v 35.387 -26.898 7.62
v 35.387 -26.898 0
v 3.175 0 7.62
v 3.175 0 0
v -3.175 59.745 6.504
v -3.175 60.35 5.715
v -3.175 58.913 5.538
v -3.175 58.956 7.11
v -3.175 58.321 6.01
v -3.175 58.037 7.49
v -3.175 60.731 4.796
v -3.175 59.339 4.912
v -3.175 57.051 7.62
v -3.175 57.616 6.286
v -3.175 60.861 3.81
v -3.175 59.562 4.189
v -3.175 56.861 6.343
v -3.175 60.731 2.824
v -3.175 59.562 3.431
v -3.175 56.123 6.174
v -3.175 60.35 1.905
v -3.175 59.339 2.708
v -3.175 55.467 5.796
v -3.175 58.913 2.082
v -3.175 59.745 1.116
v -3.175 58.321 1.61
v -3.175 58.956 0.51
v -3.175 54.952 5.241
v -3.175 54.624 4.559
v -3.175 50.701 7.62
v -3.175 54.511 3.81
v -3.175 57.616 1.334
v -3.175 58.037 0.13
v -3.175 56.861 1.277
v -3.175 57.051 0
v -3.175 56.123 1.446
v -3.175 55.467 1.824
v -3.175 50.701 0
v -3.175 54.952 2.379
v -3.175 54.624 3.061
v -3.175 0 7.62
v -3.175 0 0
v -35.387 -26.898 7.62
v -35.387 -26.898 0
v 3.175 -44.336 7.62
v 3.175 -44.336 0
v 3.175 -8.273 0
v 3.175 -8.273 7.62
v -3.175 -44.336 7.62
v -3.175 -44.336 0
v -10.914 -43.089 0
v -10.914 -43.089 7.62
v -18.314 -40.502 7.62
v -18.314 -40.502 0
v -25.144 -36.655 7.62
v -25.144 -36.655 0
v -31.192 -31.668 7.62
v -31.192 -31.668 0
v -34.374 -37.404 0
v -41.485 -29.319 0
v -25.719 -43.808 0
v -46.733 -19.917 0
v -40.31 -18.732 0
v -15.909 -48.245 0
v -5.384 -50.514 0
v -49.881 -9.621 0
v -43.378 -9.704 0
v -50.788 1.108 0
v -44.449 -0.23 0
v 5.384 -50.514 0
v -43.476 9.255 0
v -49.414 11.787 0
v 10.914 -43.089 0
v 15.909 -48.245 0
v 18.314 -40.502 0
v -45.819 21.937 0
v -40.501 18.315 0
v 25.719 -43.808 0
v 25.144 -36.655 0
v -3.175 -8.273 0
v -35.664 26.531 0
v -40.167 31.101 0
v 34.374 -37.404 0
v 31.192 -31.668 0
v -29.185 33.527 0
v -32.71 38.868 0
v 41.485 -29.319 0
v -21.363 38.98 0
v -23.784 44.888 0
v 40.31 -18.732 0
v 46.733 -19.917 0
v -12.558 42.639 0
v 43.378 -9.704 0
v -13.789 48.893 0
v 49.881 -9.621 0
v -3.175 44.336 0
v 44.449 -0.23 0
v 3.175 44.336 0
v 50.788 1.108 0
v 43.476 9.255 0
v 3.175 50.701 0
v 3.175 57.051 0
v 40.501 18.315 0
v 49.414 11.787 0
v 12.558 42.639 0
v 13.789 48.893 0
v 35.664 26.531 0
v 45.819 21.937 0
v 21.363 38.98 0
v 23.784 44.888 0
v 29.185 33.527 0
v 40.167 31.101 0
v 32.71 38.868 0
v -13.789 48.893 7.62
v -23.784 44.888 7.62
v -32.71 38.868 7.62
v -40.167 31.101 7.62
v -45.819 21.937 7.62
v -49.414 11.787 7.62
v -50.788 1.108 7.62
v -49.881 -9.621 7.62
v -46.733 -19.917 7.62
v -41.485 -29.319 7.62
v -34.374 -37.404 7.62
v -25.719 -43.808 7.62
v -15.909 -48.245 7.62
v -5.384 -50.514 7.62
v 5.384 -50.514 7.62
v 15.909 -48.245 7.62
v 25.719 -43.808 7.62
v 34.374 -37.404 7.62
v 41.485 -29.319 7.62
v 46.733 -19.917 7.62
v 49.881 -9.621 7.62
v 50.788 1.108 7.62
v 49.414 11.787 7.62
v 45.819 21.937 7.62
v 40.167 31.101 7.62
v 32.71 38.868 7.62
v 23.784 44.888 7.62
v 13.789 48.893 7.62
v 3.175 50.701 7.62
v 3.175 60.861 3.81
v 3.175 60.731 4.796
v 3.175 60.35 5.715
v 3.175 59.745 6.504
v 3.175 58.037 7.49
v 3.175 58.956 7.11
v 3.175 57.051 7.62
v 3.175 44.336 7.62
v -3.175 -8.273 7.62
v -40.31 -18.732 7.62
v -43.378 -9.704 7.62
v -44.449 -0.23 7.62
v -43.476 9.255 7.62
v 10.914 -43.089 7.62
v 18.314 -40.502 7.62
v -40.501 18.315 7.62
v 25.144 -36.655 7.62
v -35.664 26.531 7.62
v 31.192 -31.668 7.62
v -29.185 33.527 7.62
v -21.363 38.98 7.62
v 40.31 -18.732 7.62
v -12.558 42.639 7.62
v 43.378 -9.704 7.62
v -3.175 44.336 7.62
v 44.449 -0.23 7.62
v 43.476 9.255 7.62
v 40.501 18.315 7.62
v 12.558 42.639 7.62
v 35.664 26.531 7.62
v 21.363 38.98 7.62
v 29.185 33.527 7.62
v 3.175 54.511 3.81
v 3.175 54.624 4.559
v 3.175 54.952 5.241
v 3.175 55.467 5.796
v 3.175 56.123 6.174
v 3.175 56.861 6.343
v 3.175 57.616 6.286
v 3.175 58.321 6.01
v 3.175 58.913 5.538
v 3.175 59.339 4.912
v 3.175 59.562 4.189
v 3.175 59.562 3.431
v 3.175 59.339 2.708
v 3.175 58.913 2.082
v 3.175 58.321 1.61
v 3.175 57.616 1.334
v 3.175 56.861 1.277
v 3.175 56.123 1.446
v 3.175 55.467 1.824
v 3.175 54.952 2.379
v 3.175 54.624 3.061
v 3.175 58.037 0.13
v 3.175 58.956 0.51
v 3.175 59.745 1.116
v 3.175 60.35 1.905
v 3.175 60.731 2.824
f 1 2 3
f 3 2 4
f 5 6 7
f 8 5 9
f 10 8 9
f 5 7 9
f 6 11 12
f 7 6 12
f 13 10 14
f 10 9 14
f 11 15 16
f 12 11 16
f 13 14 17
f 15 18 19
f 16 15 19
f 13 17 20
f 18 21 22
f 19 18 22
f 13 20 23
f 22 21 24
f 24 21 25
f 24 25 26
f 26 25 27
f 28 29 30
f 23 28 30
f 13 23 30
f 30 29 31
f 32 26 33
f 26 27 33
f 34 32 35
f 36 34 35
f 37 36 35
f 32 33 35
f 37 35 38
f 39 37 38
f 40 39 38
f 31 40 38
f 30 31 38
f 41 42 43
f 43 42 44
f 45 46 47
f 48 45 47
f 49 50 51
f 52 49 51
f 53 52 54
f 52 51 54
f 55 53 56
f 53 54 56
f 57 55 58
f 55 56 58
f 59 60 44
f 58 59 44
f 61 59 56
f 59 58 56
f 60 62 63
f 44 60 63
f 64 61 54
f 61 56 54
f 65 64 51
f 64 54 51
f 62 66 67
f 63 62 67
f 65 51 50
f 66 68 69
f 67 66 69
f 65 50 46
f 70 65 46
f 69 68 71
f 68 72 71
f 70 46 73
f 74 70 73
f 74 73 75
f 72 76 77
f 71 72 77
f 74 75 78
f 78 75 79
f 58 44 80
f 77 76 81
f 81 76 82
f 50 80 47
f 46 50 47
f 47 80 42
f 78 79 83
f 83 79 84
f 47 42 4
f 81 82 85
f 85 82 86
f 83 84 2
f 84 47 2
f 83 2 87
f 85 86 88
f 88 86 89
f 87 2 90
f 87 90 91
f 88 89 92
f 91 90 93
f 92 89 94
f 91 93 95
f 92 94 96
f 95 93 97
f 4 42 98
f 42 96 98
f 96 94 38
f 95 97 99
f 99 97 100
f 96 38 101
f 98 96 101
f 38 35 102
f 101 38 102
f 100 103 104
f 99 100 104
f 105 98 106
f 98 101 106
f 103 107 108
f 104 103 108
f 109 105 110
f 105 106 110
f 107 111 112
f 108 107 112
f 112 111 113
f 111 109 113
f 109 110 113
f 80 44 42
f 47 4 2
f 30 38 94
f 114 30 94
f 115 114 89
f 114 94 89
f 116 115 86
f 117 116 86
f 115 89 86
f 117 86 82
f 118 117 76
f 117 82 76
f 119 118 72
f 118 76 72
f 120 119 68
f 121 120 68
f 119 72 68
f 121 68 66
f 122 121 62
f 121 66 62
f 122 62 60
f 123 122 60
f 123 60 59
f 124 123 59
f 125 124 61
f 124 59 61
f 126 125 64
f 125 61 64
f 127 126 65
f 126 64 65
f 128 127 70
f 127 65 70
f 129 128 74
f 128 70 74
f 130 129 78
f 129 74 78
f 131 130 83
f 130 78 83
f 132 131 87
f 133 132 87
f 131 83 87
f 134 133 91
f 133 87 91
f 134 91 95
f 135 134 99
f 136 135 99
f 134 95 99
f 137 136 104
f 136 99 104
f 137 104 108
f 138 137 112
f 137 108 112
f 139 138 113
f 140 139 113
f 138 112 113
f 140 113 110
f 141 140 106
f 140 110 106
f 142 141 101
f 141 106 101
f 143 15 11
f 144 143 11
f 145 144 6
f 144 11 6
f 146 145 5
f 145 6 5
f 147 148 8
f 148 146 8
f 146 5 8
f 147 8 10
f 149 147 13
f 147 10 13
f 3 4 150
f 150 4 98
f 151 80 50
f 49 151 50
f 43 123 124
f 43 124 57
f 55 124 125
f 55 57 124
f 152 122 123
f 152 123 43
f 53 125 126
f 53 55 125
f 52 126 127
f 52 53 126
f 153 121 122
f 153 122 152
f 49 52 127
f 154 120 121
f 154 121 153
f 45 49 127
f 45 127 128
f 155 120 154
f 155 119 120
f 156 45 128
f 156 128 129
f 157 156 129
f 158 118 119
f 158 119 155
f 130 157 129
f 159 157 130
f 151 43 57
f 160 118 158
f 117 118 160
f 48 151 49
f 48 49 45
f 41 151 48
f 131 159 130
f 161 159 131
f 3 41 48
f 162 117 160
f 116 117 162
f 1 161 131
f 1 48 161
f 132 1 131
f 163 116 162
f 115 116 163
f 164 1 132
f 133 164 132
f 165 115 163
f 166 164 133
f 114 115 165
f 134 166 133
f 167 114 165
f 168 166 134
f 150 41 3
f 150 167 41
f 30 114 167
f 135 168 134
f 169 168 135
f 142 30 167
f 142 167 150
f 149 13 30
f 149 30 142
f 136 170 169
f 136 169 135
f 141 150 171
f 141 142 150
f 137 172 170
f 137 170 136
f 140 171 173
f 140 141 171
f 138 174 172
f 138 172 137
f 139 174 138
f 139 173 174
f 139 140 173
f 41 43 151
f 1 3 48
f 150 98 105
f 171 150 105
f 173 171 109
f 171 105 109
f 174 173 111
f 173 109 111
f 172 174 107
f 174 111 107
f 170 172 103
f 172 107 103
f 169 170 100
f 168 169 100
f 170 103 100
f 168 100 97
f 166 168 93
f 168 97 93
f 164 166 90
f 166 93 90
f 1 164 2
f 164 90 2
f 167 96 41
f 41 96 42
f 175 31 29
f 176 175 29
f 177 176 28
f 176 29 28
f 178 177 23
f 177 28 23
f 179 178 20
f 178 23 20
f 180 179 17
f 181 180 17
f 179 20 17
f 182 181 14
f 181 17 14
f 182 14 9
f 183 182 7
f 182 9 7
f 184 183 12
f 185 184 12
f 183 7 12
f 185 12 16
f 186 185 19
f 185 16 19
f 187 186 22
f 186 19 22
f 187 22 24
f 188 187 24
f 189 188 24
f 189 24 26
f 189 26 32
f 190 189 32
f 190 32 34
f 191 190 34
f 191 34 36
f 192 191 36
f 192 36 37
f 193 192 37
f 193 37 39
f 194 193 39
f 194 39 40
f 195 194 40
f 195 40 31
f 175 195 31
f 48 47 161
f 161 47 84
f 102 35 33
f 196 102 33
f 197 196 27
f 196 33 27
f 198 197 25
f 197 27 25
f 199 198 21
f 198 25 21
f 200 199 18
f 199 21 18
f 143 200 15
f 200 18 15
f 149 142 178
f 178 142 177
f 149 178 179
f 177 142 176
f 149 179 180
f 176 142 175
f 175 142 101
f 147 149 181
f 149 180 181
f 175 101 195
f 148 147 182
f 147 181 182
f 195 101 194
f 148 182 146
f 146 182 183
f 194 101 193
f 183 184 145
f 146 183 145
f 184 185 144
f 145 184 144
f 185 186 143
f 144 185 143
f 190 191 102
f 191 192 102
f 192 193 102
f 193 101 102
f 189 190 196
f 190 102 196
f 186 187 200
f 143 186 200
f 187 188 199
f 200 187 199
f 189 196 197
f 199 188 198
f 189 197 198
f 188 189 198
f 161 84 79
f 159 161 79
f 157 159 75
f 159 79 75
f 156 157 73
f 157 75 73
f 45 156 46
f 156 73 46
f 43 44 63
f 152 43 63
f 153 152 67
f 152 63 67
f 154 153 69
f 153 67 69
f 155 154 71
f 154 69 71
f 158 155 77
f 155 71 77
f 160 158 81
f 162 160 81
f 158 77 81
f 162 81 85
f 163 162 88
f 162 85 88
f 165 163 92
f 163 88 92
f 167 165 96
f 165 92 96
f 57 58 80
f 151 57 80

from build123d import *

# Parameters (mm, degrees)
F1_DEPTH = 7.62
F2_R     = 2.54
F3_DEPTH = 25.4


with BuildPart() as f1:
    # F0 (on Top) → F1 (new body)
    with BuildSketch(Plane.XY):
        with BuildLine():
            Line((-3.175, 60.860684), (-3.175, 50.700684))
            ThreePointArc((-3.175, 50.700684), (0, -50.8), (3.175, 50.700684))
            Line((3.175, 50.700684), (3.175, 60.860684))
            Line((3.175, 60.860684), (-3.175, 60.860684))
        make_face()
        with BuildLine():
            Line((-31.192057, -31.667934), (-3.175, -8.272762))
            Line((-3.175, -8.272762), (-3.175, -44.336462))
            ThreePointArc((-3.175, -44.336462), (-18.313835, -40.501925), (-31.192057, -31.667934))
        make_face(mode=Mode.SUBTRACT)
        with BuildLine():
            Line((3.175, -44.336462), (3.175, -8.272762))
            Line((3.175, -8.272762), (31.192057, -31.667934))
            ThreePointArc((31.192057, -31.667934), (18.313835, -40.501925), (3.175, -44.336462))
        make_face(mode=Mode.SUBTRACT)
        with BuildLine():
            ThreePointArc((-35.38748, -26.89849), (-40.501491, 18.314794), (-3.175, 44.336462))
            Line((-3.175, 44.336462), (-3.175, 0))
            Line((-3.175, 0), (-35.38748, -26.89849))
        make_face(mode=Mode.SUBTRACT)
        with BuildLine():
            Line((3.175, 0), (3.175, 44.336462))
            ThreePointArc((3.175, 44.336462), (40.501491, 18.314794), (35.38748, -26.89849))
            Line((35.38748, -26.89849), (3.175, 0))
        make_face(mode=Mode.SUBTRACT)
    extrude(amount=F1_DEPTH)

    # F2 (on face) → F3 (cut)
    with BuildSketch(Plane(origin=(-3.175, 0, 0), x_dir=(0, -1, 0), z_dir=(-1, 0, 0))):
        with Locations((-57.050684, 3.81)):
            Circle(F2_R)
        with BuildLine():
            ThreePointArc((-60.860684, 3.81), (-59.744761, 6.504077), (-57.050684, 7.62))
            Line((-57.050684, 7.62), (-60.860684, 7.62))
            Line((-60.860684, 7.62), (-60.860684, 3.81))
        make_face()
        with BuildLine():
            Line((-60.860684, 0), (-57.050684, 0))
            ThreePointArc((-57.050684, 0), (-59.744761, 1.115923), (-60.860684, 3.81))
            Line((-60.860684, 3.81), (-60.860684, 0))
        make_face()
    extrude(amount=-F3_DEPTH, mode=Mode.SUBTRACT)


solid = f1.part
